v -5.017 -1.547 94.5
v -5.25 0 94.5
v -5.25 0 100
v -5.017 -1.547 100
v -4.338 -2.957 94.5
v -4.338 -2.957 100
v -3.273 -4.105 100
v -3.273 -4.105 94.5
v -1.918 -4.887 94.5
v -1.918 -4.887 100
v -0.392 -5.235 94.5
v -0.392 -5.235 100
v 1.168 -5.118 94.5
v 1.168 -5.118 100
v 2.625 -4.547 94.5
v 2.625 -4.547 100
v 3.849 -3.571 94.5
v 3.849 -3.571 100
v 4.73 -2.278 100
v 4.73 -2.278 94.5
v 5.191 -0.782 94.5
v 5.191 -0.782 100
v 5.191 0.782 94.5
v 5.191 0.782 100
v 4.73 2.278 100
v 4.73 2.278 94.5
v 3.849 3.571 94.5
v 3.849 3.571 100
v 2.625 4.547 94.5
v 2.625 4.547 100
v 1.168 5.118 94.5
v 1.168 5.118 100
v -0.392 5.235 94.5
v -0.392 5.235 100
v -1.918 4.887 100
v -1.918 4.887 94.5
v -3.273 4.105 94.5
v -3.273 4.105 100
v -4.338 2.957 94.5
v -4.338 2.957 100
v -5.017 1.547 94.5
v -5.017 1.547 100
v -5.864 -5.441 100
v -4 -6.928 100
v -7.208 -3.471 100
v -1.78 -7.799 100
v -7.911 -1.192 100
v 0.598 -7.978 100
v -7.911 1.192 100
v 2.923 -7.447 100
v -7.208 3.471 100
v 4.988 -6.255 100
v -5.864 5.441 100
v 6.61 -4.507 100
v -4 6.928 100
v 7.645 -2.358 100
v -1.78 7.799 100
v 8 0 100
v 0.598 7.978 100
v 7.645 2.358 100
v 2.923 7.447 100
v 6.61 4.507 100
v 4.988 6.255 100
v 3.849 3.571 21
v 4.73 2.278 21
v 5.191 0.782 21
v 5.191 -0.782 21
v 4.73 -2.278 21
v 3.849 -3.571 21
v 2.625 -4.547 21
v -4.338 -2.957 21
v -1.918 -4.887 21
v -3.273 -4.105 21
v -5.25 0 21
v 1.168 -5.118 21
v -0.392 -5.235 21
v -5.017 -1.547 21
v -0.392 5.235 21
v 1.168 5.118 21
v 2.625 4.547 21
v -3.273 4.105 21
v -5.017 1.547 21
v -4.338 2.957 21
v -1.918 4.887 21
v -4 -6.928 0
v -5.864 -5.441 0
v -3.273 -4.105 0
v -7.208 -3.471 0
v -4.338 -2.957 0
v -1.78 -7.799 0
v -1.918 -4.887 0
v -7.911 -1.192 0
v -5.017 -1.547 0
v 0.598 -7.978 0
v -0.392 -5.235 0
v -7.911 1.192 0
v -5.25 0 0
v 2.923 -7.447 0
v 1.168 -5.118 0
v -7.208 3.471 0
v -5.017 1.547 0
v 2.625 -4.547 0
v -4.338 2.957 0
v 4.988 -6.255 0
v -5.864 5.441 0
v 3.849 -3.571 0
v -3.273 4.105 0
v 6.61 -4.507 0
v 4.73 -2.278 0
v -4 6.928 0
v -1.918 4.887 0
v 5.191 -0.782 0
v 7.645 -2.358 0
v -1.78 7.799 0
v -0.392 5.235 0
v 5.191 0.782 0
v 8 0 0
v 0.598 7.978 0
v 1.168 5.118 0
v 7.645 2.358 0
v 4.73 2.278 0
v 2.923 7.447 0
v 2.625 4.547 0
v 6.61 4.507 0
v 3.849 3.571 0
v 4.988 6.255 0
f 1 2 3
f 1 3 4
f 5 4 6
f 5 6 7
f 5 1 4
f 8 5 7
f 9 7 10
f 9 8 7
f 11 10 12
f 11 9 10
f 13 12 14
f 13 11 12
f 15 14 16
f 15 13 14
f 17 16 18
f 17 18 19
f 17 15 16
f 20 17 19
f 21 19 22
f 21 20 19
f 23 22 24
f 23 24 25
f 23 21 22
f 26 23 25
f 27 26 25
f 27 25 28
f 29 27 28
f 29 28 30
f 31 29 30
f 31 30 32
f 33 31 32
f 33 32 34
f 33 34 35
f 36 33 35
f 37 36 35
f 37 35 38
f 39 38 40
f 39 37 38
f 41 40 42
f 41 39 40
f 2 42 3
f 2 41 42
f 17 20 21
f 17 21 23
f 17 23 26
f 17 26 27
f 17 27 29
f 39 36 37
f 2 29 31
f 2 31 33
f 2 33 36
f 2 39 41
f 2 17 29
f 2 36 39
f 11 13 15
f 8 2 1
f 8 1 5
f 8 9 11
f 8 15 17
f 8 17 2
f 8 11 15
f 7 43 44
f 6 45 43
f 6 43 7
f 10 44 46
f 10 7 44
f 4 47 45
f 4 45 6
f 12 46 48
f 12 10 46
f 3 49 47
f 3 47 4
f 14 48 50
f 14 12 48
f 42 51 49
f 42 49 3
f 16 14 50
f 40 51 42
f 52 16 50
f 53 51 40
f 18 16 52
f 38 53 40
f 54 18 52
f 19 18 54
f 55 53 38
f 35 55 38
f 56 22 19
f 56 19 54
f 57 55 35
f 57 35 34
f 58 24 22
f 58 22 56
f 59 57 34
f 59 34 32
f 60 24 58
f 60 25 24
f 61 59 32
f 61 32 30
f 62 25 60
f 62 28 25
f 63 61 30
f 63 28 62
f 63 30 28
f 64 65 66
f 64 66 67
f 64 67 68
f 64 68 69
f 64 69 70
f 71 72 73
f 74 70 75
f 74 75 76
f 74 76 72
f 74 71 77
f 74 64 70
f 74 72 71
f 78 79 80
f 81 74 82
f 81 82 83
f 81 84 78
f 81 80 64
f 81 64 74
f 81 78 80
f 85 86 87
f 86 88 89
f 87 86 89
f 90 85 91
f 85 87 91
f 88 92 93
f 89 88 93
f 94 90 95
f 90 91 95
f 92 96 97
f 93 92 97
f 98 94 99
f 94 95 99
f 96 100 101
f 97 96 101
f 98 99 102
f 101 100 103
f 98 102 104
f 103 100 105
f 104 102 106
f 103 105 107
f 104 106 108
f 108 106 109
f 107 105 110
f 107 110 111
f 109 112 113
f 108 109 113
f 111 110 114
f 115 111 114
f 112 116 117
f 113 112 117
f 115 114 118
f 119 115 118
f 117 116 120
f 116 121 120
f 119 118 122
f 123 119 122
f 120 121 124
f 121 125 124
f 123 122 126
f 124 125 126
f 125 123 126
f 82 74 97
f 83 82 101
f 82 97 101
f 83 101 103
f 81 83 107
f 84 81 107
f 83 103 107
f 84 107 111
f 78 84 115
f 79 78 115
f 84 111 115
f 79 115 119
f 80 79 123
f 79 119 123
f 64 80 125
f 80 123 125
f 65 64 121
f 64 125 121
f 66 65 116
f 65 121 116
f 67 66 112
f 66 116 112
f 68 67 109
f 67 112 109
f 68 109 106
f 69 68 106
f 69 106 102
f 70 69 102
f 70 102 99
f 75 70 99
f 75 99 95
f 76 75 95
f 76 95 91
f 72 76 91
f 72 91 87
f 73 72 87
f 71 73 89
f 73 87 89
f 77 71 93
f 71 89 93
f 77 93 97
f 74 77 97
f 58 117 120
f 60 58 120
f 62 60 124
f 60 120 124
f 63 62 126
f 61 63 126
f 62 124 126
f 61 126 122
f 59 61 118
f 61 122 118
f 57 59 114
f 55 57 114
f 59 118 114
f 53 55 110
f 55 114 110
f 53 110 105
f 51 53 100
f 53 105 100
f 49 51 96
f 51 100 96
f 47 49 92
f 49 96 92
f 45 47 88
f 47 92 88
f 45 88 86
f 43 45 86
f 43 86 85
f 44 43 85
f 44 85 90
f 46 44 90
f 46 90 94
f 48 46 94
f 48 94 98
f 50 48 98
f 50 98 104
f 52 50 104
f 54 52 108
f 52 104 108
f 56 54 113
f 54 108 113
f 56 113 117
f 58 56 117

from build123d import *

# Parameters (mm, degrees)
SKETCH2_R           = 8
BOSS_EXTRUDE1_DEPTH = 100
SKETCH3_R           = 5.25
CUT_EXTRUDE1_DEPTH  = 21
CUT_EXTRUDE2_START  = -5.5
SKETCH4_R           = 5.25
CUT_EXTRUDE2_DEPTH  = 5.5


with BuildPart() as part:
    # Sketch2 → Boss-Extrude1 (new body)
    with BuildSketch(Plane.XY):
        Circle(SKETCH2_R)
    extrude(amount=BOSS_EXTRUDE1_DEPTH)

    # Sketch3 → Cut-Extrude1 (cut)
    with BuildSketch(Plane(origin=(0, 0, 0), x_dir=(-1, 0, 0), z_dir=(0, 0, -1))):
        Circle(SKETCH3_R)
    extrude(amount=-CUT_EXTRUDE1_DEPTH, mode=Mode.SUBTRACT)

    # Sketch4 → Cut-Extrude2 (cut)
    with BuildSketch(Plane.XY.offset(100).offset(CUT_EXTRUDE2_START)):
        Circle(SKETCH4_R)
    extrude(amount=CUT_EXTRUDE2_DEPTH, mode=Mode.SUBTRACT)


solid = part.part
